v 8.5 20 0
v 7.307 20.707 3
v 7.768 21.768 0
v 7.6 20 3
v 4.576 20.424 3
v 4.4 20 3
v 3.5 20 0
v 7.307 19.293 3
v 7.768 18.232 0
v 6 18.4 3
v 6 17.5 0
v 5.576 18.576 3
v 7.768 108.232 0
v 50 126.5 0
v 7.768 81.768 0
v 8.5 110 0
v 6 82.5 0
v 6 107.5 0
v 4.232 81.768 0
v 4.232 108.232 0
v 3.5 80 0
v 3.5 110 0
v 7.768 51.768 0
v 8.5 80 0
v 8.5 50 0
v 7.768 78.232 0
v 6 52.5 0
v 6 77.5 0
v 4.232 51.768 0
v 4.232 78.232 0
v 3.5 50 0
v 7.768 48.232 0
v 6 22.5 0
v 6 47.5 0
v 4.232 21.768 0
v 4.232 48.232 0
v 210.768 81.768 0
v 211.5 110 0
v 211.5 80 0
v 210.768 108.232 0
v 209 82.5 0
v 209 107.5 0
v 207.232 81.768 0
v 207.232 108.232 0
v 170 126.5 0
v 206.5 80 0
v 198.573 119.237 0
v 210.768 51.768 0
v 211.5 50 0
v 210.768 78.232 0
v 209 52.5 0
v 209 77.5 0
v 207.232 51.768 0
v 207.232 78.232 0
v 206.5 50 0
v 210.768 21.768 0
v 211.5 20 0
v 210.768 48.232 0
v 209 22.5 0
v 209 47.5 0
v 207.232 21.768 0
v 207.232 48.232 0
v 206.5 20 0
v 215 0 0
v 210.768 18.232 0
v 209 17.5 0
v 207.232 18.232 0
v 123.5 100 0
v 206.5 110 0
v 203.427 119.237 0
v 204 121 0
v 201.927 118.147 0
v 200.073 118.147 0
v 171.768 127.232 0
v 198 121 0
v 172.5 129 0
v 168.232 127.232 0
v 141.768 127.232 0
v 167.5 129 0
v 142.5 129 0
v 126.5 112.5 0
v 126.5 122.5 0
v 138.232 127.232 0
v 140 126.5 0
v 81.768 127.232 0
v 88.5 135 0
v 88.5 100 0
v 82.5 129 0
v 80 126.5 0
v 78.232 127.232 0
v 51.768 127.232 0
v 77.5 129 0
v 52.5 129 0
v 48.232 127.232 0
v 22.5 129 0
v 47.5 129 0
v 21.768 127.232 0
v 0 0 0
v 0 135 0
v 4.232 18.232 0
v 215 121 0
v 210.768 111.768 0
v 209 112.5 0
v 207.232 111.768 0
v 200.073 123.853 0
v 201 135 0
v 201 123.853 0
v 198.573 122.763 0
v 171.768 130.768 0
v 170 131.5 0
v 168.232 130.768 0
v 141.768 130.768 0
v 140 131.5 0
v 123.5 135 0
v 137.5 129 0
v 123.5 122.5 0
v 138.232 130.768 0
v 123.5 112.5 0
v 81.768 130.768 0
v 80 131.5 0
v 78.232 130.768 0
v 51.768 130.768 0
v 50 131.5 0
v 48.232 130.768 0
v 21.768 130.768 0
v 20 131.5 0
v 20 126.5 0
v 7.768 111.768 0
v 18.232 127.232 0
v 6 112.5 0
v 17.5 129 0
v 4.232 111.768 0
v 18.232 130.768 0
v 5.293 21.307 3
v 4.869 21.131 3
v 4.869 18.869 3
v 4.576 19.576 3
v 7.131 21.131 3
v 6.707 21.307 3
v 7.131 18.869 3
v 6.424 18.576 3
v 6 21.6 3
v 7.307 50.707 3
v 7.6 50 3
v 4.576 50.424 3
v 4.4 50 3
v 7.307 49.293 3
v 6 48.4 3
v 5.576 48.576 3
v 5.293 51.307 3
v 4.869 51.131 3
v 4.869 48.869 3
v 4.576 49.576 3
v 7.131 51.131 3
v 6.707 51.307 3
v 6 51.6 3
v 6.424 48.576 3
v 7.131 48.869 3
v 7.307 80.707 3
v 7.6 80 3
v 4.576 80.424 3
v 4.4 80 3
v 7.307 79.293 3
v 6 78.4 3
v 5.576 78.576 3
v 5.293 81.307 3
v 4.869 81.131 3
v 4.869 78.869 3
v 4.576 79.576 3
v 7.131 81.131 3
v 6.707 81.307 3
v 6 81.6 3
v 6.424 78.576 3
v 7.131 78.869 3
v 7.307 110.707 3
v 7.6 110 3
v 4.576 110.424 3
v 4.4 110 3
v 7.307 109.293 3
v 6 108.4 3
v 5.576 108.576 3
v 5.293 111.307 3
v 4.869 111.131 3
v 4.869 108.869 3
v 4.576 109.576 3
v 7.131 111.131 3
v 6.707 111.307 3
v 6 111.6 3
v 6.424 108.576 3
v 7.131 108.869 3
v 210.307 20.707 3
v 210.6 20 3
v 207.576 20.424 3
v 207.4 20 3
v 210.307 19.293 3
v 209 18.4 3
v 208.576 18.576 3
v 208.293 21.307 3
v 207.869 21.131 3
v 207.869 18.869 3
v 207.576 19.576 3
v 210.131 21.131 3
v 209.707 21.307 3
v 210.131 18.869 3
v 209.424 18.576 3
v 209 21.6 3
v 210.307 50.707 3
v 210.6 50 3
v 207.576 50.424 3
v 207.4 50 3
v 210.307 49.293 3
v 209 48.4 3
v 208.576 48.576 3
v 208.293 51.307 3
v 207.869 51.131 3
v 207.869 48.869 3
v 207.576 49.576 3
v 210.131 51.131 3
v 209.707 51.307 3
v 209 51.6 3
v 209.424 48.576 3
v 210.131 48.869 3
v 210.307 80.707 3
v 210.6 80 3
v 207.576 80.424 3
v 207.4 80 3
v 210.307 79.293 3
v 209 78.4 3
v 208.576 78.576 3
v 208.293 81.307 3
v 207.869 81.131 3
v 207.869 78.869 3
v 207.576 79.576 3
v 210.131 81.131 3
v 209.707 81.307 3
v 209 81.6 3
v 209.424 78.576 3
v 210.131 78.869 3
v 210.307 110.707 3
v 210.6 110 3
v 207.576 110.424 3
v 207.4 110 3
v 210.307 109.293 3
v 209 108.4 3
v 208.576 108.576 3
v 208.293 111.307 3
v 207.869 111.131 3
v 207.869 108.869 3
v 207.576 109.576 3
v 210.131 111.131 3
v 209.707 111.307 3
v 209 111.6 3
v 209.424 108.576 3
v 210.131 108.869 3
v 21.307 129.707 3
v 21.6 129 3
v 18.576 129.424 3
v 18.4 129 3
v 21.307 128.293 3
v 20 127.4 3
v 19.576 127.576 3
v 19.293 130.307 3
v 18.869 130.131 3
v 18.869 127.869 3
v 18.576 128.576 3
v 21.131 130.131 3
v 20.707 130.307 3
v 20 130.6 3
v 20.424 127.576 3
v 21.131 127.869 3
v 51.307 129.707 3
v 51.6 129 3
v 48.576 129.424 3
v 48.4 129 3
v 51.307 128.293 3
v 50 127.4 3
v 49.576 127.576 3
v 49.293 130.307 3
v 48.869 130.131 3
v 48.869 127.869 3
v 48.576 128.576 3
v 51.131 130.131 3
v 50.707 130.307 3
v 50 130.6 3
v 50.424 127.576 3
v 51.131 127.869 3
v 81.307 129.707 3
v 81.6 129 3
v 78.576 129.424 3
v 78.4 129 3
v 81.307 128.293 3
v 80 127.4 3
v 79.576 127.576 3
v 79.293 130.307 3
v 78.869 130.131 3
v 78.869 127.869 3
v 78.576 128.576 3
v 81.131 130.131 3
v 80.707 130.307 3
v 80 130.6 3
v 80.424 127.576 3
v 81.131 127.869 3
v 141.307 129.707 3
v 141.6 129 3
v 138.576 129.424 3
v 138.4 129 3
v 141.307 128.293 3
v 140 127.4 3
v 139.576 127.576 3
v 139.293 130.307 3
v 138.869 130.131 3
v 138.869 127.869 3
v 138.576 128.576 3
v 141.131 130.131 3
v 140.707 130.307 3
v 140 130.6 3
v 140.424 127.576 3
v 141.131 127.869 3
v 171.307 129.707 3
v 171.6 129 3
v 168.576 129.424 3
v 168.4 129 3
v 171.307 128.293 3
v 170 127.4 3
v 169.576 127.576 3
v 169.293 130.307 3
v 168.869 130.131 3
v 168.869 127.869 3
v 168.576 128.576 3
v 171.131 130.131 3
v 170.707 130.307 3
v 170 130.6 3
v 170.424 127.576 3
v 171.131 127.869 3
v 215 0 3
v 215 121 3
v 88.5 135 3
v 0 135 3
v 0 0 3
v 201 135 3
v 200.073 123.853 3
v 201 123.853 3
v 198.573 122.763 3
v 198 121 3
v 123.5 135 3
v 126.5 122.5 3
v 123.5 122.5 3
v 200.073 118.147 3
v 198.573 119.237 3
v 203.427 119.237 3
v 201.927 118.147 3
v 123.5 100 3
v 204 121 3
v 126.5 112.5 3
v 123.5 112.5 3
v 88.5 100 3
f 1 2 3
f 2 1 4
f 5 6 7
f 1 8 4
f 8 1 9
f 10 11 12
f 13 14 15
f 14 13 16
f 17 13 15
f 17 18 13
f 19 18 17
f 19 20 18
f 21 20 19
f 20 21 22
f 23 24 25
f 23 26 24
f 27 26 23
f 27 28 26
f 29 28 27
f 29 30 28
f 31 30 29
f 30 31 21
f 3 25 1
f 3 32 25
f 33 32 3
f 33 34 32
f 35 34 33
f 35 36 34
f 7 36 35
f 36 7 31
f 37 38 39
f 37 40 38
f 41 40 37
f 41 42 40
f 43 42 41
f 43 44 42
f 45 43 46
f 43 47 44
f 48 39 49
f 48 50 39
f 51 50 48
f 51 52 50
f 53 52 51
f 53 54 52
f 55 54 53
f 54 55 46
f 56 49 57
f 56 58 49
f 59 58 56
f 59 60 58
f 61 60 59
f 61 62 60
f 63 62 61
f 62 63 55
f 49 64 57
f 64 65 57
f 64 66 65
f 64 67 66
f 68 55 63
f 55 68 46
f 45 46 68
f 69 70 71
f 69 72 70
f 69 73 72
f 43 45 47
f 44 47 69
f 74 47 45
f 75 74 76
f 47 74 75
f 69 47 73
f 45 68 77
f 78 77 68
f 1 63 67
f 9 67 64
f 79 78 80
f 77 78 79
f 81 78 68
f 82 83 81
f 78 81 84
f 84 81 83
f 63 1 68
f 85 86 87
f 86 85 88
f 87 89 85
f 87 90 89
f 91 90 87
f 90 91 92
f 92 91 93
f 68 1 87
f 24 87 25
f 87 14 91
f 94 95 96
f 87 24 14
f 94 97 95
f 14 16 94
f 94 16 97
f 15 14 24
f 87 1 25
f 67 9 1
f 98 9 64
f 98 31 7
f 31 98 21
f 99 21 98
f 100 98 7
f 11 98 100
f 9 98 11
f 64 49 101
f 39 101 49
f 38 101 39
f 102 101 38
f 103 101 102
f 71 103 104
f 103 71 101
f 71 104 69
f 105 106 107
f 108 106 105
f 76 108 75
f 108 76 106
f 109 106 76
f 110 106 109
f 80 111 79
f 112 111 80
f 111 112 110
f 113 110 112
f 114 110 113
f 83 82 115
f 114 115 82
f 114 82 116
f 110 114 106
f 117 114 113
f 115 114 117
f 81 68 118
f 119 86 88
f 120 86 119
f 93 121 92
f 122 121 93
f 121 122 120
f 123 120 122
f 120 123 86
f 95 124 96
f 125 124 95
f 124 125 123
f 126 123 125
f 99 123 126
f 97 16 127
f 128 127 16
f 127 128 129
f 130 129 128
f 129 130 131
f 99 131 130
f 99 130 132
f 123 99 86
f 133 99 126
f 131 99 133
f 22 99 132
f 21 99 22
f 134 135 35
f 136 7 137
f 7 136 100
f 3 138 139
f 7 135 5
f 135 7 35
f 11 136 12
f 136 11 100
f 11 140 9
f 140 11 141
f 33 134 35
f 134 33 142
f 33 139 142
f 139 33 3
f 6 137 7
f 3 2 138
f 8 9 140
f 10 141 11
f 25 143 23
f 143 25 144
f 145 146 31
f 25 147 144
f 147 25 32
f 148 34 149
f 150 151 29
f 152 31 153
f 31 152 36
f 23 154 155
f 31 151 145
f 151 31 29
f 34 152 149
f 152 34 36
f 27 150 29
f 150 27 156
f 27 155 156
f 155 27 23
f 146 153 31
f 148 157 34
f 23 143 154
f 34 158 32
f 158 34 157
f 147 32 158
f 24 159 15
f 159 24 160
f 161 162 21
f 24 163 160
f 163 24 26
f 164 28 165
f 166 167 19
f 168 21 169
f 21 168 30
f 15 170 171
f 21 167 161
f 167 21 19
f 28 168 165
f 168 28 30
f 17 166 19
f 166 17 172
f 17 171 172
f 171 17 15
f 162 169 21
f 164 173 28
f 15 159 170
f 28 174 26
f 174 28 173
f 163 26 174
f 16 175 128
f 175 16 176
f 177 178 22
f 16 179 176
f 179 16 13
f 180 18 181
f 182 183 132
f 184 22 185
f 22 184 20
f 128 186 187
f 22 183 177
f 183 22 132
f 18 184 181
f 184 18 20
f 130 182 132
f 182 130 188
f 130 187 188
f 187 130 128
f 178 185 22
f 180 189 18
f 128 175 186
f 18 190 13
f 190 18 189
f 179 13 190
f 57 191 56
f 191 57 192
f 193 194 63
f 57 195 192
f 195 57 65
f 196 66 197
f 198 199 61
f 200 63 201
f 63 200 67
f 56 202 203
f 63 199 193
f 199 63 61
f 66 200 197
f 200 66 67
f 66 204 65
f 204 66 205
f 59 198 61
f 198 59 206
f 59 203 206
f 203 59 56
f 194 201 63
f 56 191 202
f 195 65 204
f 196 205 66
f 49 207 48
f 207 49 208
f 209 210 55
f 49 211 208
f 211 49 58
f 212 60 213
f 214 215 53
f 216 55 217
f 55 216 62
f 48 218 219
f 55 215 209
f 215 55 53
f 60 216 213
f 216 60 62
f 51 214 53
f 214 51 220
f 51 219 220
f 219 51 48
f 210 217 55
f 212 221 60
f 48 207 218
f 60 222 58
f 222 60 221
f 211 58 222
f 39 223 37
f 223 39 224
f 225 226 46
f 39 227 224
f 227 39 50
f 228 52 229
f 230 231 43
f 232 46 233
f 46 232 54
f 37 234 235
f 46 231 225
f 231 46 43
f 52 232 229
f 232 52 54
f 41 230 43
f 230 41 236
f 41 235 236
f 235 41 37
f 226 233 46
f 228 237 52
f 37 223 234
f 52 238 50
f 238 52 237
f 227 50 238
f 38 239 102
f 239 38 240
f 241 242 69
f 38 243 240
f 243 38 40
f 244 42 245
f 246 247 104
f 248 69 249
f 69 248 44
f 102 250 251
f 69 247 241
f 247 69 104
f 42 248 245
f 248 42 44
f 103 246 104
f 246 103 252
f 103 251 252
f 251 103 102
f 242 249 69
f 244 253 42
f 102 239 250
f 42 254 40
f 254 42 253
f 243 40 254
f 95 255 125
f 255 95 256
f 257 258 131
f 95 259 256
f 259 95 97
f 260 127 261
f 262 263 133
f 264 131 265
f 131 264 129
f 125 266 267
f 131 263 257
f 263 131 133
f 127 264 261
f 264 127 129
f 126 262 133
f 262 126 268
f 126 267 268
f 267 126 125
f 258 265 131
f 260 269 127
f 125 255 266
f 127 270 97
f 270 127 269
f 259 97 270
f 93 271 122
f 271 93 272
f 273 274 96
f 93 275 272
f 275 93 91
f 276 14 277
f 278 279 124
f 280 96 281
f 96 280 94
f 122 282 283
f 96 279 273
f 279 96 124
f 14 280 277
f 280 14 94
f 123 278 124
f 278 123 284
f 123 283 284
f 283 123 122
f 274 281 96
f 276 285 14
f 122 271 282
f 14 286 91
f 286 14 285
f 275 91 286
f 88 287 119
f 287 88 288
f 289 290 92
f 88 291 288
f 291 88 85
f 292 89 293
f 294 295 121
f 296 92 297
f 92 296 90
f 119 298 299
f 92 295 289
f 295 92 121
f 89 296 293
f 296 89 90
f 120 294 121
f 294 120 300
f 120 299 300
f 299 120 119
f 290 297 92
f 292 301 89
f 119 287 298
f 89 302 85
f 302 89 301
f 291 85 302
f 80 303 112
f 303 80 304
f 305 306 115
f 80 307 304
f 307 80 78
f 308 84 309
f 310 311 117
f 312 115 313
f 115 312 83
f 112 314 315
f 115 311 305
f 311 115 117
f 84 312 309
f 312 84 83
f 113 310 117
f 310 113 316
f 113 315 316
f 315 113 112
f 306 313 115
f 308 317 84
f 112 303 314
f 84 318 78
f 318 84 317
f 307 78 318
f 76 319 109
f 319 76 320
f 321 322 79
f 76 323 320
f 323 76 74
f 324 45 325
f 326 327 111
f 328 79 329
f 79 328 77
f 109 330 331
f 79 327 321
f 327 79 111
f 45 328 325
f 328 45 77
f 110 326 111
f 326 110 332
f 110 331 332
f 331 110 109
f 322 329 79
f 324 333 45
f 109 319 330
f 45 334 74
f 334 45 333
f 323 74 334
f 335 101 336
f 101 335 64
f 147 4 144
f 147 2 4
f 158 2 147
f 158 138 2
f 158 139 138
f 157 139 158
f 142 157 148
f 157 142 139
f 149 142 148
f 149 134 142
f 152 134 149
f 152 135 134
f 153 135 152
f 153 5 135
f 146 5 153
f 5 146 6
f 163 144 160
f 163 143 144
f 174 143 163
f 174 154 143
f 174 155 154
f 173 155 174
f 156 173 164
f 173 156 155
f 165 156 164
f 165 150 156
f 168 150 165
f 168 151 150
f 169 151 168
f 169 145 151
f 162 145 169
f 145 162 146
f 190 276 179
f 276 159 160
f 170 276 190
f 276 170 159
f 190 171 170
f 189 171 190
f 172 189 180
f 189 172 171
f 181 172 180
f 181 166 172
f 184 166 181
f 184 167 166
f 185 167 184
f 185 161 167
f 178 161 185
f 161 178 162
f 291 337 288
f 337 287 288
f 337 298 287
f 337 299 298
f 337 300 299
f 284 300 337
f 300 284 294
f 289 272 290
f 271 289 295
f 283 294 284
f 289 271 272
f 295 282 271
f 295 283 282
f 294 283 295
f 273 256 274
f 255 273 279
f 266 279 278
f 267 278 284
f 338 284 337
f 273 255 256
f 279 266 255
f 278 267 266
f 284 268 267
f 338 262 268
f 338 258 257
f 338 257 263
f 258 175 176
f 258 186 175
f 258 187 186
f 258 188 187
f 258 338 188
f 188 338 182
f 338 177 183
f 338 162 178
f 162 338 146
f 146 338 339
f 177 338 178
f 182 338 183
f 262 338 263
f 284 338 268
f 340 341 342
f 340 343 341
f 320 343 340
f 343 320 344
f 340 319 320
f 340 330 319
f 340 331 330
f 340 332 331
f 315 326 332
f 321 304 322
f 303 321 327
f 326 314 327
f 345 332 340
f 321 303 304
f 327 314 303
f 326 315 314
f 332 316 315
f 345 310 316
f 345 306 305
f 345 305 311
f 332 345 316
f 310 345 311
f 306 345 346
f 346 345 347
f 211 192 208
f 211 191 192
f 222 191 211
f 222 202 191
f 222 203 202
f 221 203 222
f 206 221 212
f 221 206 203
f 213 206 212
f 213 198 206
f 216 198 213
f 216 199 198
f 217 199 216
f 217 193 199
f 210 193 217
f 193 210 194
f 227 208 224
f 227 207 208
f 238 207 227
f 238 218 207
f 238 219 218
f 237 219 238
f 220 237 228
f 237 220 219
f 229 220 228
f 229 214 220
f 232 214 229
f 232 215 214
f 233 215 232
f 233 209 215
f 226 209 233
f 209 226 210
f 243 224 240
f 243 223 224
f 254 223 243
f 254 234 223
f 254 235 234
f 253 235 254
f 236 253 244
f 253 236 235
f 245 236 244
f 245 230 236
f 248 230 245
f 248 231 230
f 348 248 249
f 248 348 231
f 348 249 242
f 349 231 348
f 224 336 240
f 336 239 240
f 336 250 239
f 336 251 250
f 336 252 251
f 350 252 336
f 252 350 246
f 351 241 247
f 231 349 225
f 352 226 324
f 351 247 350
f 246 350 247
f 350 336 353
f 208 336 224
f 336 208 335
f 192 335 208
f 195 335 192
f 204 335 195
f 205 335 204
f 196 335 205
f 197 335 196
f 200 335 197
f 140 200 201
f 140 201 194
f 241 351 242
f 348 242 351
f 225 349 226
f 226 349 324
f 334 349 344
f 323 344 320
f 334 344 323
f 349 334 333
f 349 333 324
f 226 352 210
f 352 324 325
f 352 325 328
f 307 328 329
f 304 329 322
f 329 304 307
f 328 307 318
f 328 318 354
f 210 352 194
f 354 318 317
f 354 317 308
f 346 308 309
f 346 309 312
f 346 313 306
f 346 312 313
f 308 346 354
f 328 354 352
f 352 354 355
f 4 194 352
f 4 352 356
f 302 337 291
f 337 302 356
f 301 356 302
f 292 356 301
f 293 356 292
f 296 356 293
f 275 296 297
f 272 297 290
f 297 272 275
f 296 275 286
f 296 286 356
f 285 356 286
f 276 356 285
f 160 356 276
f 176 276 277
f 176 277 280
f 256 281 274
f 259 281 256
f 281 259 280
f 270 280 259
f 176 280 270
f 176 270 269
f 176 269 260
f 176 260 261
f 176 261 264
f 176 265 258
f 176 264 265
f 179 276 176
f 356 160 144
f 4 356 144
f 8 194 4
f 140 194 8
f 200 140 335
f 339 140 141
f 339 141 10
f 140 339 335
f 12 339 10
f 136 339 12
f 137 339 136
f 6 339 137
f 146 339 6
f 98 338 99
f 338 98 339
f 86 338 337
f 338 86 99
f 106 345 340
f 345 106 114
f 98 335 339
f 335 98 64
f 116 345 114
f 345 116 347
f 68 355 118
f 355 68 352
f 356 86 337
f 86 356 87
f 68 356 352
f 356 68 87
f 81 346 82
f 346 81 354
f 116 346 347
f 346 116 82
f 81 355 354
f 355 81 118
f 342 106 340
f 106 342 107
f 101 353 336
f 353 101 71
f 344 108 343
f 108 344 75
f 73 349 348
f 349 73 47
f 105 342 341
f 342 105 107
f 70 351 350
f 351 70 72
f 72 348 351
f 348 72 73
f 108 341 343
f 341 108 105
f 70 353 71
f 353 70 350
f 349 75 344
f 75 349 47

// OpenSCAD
//bottom plate

//front();
back();

module back() {
difference() {
cube([215, 135, 3]);
    //cut-out Nema 14
translate([88.5, 135-35, 0]) cube([35, 35, 3]);
translate([88.5+35, 135-35/2-5, 0]) cube([3, 10, 3]);
    //cut-out cables
translate([215-14, 135-14, 0]) cube([14, 14, 3]);
    translate([215-14, 135-14, 0]) cylinder(r=3, h=3);
    holes(); }
}
module front() {
    difference() {
        cube([215, 135, 3]);    
        holes();
    }
}
module holes() {
    for (i=[1:5])
        translate([6, i*30-10, 0]) cylinder(5, 2.5);
    for (i=[1:5])
        translate([215-6, i*30-10, 0]) cylinder(5, 2.5);
    for (i=[1:6])
        translate([i*30-10, 135-6, 0]) cylinder(5, 2.5);
}
